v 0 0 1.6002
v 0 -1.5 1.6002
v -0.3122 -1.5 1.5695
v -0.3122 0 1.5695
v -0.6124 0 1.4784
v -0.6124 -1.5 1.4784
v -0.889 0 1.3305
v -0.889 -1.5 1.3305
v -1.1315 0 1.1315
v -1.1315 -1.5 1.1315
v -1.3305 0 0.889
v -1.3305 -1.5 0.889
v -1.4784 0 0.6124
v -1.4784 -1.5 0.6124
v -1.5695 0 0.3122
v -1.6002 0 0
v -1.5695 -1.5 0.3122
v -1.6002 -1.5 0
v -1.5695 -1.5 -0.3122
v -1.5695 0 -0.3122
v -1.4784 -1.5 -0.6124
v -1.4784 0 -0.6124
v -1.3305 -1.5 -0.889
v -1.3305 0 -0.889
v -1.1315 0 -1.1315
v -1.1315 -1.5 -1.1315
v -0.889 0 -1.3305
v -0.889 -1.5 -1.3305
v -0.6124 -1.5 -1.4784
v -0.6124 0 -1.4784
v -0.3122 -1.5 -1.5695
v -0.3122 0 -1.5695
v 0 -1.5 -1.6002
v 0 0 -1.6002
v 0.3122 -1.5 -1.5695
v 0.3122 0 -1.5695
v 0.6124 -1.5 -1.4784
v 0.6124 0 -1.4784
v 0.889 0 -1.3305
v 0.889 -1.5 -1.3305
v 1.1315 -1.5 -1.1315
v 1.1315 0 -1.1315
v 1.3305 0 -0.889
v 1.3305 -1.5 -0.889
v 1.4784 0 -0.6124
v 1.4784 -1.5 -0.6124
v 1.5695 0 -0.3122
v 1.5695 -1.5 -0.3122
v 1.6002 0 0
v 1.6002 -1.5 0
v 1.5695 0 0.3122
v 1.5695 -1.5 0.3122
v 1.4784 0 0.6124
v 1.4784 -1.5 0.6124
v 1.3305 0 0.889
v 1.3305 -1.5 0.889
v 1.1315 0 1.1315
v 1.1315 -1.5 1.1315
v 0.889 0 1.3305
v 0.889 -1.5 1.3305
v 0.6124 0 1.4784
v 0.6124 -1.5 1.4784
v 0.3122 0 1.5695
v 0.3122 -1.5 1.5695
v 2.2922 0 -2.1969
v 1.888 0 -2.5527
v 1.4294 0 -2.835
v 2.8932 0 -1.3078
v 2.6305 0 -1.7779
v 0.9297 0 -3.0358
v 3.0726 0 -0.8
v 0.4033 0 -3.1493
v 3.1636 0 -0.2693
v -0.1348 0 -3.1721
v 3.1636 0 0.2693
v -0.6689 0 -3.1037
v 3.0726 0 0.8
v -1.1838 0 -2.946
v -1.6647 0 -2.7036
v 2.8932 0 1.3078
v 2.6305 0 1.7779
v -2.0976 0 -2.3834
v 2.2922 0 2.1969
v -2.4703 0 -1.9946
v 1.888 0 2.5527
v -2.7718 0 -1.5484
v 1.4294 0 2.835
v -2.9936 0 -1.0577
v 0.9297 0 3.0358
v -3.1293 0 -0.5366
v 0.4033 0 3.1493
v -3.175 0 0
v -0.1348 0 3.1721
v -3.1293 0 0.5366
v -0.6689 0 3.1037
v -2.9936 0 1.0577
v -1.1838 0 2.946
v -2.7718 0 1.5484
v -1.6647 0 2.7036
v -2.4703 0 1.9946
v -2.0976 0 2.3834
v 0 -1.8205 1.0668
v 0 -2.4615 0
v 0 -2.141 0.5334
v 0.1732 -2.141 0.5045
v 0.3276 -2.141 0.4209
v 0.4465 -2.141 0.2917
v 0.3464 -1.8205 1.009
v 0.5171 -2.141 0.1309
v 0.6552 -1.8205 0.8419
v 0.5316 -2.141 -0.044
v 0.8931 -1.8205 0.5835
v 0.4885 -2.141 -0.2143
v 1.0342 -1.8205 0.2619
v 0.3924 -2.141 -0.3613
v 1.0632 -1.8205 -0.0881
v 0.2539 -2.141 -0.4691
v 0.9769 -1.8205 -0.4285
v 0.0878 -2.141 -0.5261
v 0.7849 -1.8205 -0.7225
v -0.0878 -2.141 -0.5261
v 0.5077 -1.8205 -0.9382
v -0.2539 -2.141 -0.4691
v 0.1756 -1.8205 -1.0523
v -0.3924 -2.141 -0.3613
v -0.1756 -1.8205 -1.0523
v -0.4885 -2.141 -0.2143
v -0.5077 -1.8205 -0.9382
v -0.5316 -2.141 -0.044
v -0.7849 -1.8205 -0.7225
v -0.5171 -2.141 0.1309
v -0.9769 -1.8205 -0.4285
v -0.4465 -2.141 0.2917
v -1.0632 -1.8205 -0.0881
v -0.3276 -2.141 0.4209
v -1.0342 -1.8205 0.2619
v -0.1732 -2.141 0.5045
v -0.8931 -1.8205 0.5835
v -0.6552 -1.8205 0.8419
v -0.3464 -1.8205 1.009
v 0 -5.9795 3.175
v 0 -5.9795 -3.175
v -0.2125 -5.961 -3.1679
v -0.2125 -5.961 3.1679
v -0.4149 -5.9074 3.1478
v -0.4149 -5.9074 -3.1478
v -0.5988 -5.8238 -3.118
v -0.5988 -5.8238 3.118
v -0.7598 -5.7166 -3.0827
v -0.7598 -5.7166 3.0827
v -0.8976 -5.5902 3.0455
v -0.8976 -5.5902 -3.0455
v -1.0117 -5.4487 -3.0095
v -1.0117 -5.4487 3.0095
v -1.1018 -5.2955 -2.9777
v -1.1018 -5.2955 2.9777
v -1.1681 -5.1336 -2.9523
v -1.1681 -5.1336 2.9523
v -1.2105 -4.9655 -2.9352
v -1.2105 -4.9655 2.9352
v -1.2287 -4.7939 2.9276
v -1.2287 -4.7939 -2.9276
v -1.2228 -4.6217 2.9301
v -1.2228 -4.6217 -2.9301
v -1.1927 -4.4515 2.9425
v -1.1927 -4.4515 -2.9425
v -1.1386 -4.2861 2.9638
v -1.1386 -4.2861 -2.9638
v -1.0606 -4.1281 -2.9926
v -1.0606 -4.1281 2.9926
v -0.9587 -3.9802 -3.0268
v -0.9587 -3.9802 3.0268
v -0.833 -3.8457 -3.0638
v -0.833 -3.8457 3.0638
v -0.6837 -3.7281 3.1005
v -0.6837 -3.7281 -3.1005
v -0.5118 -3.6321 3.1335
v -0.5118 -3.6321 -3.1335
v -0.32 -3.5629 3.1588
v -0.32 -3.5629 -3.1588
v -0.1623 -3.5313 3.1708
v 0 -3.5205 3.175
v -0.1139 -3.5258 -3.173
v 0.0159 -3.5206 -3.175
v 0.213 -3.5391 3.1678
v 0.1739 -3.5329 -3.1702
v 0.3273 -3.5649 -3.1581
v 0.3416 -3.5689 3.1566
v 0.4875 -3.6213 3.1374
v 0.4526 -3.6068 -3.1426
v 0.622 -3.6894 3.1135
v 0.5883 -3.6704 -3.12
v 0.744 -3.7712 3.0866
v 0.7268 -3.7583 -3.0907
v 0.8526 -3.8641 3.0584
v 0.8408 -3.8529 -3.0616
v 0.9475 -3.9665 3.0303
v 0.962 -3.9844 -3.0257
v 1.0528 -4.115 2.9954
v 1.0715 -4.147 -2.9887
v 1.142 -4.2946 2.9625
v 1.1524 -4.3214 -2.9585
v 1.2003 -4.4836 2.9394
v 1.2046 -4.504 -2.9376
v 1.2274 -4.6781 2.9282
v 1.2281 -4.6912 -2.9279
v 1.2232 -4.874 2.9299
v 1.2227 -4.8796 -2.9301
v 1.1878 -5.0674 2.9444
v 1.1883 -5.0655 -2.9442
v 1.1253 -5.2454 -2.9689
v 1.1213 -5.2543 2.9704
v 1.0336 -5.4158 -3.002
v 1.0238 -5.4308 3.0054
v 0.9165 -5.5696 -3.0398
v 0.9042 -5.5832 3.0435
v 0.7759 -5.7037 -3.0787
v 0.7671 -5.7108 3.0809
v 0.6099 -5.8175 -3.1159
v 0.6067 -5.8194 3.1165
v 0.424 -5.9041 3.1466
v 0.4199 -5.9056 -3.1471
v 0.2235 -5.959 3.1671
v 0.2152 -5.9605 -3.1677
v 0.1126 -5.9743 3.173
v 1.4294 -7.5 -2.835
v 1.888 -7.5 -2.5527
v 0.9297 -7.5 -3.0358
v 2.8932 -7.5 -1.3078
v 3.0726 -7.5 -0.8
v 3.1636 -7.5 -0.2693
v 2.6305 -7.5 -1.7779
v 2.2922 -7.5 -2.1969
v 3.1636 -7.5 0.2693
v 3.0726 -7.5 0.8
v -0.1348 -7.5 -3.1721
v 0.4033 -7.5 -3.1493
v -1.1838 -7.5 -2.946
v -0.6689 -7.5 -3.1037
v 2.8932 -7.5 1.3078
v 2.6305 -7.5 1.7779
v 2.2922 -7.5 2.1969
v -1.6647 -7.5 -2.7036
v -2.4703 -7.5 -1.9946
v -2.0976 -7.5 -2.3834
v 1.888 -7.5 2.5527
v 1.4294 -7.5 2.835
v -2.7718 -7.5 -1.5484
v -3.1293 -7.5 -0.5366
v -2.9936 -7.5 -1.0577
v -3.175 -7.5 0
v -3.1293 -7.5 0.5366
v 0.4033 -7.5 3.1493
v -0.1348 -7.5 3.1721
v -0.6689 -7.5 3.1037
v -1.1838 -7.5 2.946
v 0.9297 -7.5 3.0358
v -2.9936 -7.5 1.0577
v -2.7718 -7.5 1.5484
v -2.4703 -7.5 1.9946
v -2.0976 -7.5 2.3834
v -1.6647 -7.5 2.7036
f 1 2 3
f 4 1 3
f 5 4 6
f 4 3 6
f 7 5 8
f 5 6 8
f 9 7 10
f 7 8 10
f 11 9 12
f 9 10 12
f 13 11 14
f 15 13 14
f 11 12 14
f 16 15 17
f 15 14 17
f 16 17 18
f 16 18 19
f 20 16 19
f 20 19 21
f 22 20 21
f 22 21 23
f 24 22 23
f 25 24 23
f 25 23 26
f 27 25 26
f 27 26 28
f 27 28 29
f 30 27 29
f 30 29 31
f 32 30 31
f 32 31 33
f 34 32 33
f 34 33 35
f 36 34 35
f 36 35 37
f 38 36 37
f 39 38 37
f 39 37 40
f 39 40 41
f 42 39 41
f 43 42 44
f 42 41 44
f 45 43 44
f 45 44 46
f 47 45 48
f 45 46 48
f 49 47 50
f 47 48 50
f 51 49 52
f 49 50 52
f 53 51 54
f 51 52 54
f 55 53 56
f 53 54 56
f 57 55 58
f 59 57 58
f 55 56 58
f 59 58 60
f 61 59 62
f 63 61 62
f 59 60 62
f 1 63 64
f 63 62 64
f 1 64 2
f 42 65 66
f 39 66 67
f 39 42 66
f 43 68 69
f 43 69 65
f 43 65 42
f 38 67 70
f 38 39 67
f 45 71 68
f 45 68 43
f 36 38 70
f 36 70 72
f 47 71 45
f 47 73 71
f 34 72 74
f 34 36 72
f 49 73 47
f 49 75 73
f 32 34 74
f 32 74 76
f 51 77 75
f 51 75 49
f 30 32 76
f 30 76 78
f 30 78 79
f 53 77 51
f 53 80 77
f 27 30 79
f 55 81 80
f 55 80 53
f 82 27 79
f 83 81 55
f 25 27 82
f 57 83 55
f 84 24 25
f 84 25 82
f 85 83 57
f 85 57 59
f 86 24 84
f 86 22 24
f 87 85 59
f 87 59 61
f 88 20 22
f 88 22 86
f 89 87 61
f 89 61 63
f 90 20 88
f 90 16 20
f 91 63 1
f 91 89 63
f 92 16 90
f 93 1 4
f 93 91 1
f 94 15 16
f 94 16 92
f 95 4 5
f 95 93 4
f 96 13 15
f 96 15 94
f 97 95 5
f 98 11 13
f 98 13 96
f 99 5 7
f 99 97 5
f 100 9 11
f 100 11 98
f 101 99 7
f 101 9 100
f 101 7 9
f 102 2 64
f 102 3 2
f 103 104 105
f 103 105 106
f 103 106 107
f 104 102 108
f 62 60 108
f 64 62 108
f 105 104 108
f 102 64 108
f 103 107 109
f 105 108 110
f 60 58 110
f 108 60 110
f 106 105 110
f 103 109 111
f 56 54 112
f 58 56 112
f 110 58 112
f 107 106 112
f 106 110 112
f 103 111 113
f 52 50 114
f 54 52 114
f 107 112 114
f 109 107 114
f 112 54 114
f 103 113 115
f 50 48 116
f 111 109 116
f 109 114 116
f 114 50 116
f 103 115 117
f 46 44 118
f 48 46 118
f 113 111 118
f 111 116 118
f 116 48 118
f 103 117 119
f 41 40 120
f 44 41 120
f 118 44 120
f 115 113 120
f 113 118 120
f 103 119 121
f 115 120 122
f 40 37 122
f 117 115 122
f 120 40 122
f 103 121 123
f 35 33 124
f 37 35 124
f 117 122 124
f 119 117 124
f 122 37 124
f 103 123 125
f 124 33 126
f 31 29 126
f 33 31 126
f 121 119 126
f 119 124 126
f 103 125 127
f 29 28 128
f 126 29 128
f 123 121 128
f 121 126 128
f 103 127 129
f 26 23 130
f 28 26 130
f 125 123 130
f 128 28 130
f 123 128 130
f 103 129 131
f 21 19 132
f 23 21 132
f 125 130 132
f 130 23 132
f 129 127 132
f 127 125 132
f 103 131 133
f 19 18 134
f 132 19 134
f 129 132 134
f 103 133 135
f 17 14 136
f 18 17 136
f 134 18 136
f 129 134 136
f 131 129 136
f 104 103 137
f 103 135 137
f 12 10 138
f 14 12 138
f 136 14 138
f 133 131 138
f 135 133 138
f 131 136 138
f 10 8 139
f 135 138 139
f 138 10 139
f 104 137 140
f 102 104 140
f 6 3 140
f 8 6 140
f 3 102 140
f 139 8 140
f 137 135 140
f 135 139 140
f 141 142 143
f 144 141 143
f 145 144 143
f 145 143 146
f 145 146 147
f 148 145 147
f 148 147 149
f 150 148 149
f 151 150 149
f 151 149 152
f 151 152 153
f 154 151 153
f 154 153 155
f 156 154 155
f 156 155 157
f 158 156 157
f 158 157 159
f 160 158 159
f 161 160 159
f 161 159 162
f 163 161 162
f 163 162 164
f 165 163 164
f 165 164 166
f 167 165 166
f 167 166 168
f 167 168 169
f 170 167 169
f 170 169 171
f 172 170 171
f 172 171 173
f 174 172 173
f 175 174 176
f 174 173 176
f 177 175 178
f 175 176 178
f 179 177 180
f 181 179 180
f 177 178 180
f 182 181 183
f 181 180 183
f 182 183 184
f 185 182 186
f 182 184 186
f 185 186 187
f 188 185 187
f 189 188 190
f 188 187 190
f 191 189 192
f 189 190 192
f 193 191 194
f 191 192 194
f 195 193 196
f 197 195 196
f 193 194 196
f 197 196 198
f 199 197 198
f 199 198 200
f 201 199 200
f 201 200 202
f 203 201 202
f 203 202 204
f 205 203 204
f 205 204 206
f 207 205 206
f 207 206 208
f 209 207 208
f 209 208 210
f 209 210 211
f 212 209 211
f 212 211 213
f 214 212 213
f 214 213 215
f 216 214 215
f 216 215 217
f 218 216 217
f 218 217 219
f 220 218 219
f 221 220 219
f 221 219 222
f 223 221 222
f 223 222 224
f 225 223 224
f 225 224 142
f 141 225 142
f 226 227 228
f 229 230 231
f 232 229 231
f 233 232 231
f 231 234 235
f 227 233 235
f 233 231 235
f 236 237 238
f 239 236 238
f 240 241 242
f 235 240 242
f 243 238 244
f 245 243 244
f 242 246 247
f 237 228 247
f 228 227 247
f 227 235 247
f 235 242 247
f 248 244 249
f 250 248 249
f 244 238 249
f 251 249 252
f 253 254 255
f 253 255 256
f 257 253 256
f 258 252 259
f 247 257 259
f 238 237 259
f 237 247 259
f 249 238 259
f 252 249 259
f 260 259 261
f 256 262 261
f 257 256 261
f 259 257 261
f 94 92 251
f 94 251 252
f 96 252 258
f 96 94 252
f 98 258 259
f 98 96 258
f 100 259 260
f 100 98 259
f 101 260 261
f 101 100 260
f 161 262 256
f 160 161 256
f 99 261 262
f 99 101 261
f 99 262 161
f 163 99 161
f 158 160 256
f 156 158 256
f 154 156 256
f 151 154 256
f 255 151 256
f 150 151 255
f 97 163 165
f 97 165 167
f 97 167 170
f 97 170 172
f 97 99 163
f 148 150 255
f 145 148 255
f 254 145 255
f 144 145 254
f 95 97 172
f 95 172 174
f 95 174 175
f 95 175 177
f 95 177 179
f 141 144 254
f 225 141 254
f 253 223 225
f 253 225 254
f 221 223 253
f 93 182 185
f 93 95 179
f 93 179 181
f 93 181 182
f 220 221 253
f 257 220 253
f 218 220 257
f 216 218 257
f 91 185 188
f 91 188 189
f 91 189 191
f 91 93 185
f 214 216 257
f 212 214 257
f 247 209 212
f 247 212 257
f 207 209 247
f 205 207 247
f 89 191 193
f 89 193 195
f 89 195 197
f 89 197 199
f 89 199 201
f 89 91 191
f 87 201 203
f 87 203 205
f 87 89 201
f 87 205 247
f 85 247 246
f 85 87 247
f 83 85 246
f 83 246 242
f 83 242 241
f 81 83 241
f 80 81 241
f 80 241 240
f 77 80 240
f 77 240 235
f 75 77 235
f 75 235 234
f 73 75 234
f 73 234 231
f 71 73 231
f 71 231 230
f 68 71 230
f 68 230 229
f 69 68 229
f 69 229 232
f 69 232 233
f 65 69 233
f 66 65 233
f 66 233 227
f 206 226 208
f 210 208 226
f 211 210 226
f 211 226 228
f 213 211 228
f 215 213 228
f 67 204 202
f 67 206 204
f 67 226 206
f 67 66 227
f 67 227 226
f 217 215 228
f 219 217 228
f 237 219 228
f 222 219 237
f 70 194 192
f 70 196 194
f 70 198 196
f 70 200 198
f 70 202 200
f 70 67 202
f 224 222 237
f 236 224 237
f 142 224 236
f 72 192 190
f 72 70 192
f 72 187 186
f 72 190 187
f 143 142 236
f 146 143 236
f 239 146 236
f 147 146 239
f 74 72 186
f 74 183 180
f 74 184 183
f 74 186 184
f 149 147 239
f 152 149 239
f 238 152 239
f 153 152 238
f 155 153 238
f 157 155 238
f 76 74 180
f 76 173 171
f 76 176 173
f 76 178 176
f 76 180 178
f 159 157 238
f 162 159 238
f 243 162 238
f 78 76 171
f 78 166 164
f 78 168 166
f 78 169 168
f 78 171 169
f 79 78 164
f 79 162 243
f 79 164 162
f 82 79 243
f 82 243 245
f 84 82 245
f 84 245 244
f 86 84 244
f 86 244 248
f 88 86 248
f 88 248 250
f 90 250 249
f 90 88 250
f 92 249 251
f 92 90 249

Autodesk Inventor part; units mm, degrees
ref_plane "YZ Plane" through (0, 0, 0) normal (1, 0, 0) x (0, 1, 0)
ref_plane "XZ Plane" through (0, 0, 0) normal (0, 1, 0) x (-1, 0, 0)
sketch "Sketch1" plane through (0, 0, 0) normal (0, 1, 0) x (-1, 0, 0)
  circle A0 centre (0, 0) radius 3.175
  circle A1 centre (0, 0) radius 1.5
  dimension "d0" = 6.35
  dimension "d1" = 3
extrude "Extrusion1" add sketch "Sketch1" against normal blind 7.5 contours A0 | A1
hole "Hole1" at (0, 0, 0) direction (0, -1, 0) diameter 3.2004 depth 1.5 tip angle 118 clearance for "Socket Head Cap Screw" size "M3" standard "Ansi Metric M Profile"
ref_plane "Work Plane1" through (0, 0, 3.175) normal (0, 0, 1) x (1, 0, 0)
sketch "Sketch2" plane through (0, 0, 3.175) normal (0, 0, 1) x (1, 0, 0)
  line L0 (-3.175, -7.5) -> (3.175, -7.5) projected
  line L1 (3.175, 0) -> (-3.175, 0) projected
  line L2 (-3.175, 0) -> (-3.175, -7.5) projected
  line L3 (-3.175, -2) -> (3.175, -2) construction
  circle A0 centre (0, -4.75) radius 1.5
  dimension "d11" = 2
  dimension "d12" = 3
  dimension "d13" = 2.75
  dimension "d14" = 3.175
hole "Hole2" at (0, -4.75, 3.175) direction (0, 0, -1) diameter 2.459 end through all thread size "M3x0.5" class "6H" standard "ANSI Metric M Profile"
properties part number "Bearing Nut" material "Aluminum 6061"
